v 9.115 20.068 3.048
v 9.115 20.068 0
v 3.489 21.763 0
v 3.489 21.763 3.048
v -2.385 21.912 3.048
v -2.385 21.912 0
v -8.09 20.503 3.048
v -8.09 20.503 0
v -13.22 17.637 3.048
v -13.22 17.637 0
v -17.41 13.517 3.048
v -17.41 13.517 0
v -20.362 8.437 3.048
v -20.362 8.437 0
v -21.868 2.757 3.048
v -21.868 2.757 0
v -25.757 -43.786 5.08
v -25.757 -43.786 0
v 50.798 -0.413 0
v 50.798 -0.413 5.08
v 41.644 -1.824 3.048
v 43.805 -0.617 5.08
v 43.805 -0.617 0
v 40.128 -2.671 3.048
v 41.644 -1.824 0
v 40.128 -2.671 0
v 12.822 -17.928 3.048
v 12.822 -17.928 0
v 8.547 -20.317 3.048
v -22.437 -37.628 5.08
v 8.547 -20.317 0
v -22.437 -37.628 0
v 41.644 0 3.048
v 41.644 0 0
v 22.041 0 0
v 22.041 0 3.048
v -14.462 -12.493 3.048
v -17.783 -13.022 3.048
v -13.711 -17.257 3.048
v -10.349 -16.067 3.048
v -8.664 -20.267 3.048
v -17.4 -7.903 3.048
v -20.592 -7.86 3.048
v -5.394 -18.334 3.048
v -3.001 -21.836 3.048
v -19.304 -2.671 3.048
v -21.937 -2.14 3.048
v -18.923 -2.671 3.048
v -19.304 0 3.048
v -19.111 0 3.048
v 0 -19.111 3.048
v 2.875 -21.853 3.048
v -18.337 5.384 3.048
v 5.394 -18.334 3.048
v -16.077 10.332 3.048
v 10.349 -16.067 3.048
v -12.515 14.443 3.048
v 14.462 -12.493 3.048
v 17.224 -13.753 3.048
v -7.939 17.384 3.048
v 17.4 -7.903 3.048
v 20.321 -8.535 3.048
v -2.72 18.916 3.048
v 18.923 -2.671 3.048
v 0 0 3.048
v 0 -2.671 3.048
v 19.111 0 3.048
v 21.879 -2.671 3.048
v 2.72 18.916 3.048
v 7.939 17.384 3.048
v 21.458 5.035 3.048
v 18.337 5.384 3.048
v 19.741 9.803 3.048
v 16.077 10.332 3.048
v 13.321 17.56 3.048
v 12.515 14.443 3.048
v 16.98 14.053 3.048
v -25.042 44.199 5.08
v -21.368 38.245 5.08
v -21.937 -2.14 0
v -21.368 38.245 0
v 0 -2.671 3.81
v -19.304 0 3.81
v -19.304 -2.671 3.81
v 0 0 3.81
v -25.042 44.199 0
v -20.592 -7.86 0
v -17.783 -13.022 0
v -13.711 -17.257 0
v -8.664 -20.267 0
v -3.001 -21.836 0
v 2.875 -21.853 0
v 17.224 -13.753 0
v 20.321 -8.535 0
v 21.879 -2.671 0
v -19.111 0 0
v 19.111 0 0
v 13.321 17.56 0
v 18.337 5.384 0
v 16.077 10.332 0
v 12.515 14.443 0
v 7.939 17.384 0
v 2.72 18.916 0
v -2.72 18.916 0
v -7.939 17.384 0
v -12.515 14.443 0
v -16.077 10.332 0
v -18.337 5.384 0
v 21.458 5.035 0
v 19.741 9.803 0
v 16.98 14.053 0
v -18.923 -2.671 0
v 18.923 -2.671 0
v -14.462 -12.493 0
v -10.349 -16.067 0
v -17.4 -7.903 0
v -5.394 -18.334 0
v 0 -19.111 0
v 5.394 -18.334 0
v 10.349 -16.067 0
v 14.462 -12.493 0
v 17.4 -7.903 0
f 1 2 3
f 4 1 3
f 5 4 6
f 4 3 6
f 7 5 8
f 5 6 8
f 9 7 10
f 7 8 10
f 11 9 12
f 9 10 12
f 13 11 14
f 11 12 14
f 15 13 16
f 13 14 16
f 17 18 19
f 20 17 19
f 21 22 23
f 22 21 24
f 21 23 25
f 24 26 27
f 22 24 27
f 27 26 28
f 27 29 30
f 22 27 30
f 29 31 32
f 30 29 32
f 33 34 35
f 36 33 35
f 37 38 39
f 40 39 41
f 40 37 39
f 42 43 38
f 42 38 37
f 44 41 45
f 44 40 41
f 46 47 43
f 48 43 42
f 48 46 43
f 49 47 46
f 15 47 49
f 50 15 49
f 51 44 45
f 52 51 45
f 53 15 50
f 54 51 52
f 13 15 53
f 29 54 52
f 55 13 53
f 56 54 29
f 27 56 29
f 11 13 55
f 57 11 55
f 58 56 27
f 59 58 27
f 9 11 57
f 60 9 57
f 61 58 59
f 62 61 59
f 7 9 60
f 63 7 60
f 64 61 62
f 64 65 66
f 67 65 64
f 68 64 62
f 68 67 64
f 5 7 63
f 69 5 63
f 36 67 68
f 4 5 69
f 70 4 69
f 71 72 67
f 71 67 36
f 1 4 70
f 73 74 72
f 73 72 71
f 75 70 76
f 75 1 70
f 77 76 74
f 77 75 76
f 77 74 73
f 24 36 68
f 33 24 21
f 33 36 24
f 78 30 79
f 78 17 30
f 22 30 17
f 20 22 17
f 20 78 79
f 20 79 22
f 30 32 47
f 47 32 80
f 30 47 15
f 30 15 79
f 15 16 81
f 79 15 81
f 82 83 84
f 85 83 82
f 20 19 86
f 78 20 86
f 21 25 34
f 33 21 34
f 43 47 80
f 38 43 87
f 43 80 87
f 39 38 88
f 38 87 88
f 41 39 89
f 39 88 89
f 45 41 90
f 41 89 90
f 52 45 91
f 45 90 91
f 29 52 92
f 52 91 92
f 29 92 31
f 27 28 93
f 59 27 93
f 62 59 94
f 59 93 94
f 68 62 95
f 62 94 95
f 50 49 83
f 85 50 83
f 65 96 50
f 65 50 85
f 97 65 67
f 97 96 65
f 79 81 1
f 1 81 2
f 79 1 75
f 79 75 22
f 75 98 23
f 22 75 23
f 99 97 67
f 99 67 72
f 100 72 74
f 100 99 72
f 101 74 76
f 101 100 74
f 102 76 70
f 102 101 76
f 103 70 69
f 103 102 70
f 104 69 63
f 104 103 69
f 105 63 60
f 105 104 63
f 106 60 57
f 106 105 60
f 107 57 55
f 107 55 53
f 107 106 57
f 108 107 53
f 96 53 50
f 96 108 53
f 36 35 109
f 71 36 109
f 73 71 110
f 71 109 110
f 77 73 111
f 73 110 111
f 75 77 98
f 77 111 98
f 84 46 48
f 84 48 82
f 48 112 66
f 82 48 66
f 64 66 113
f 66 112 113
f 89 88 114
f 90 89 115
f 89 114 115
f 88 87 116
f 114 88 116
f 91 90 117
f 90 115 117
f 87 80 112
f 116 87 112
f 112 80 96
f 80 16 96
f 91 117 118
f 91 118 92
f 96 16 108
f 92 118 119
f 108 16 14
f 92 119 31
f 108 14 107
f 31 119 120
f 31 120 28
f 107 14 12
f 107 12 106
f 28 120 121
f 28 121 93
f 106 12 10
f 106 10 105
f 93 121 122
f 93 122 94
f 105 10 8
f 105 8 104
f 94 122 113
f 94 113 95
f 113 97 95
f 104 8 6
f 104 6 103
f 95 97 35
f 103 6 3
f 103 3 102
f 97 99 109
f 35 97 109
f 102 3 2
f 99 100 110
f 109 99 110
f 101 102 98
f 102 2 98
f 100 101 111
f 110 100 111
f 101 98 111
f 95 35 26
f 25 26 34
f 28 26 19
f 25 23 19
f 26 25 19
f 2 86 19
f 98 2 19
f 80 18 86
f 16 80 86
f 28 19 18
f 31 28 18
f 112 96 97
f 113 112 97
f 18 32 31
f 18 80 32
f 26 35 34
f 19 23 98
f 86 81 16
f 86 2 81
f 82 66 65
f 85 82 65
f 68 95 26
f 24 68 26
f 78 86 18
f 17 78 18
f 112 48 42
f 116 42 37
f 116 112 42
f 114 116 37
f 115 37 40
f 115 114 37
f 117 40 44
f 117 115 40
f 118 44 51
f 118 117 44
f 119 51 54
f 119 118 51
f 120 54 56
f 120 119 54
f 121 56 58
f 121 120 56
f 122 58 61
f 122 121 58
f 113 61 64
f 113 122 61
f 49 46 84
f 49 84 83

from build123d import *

# Parameters (mm, degrees)
F1_DEPTH = 5.08
F2_R     = 22.04107
F2_R_2   = 19.11099
F3_DEPTH = 3.048
F4_W     = 19.304385
F4_H     = 2.671048
F5_DEPTH = 3.81
F4_W_2   = 41.644052
F6_DEPTH = 3.048


with BuildPart() as f1:
    # F0 (on Top) → F1 (new body)
    with BuildSketch(Plane.XY):
        Polygon((50.798323, -0.41276), (-25.041701, 44.199018), (-25.756622, -43.786259), align=None)
        Polygon((43.80493, -0.616712), (-22.436553, -37.627826), (-21.368377, 38.244538), align=None, mode=Mode.SUBTRACT)
    extrude(amount=F1_DEPTH)

    # F2 (on Top) → F3 (join)
    with BuildSketch(Plane.XY):
        Circle(F2_R)
        Circle(F2_R_2, mode=Mode.SUBTRACT)
    extrude(amount=F3_DEPTH)

    # F4 (on Top) → F5 (join)
    with BuildSketch(Plane.XY):
        with Locations((-9.652192, -1.335524)):
            Rectangle(F4_W, F4_H)
    extrude(amount=F5_DEPTH)

    # F4 (on Top) → F6 (join)
    with BuildSketch(Plane.XY):
        with Locations((20.822026, -1.335524)):
            Rectangle(F4_W_2, F4_H)
        with Locations((-9.652192, -1.335524)):
            Rectangle(F4_W, F4_H)
    extrude(amount=F6_DEPTH)


solid = f1.part
